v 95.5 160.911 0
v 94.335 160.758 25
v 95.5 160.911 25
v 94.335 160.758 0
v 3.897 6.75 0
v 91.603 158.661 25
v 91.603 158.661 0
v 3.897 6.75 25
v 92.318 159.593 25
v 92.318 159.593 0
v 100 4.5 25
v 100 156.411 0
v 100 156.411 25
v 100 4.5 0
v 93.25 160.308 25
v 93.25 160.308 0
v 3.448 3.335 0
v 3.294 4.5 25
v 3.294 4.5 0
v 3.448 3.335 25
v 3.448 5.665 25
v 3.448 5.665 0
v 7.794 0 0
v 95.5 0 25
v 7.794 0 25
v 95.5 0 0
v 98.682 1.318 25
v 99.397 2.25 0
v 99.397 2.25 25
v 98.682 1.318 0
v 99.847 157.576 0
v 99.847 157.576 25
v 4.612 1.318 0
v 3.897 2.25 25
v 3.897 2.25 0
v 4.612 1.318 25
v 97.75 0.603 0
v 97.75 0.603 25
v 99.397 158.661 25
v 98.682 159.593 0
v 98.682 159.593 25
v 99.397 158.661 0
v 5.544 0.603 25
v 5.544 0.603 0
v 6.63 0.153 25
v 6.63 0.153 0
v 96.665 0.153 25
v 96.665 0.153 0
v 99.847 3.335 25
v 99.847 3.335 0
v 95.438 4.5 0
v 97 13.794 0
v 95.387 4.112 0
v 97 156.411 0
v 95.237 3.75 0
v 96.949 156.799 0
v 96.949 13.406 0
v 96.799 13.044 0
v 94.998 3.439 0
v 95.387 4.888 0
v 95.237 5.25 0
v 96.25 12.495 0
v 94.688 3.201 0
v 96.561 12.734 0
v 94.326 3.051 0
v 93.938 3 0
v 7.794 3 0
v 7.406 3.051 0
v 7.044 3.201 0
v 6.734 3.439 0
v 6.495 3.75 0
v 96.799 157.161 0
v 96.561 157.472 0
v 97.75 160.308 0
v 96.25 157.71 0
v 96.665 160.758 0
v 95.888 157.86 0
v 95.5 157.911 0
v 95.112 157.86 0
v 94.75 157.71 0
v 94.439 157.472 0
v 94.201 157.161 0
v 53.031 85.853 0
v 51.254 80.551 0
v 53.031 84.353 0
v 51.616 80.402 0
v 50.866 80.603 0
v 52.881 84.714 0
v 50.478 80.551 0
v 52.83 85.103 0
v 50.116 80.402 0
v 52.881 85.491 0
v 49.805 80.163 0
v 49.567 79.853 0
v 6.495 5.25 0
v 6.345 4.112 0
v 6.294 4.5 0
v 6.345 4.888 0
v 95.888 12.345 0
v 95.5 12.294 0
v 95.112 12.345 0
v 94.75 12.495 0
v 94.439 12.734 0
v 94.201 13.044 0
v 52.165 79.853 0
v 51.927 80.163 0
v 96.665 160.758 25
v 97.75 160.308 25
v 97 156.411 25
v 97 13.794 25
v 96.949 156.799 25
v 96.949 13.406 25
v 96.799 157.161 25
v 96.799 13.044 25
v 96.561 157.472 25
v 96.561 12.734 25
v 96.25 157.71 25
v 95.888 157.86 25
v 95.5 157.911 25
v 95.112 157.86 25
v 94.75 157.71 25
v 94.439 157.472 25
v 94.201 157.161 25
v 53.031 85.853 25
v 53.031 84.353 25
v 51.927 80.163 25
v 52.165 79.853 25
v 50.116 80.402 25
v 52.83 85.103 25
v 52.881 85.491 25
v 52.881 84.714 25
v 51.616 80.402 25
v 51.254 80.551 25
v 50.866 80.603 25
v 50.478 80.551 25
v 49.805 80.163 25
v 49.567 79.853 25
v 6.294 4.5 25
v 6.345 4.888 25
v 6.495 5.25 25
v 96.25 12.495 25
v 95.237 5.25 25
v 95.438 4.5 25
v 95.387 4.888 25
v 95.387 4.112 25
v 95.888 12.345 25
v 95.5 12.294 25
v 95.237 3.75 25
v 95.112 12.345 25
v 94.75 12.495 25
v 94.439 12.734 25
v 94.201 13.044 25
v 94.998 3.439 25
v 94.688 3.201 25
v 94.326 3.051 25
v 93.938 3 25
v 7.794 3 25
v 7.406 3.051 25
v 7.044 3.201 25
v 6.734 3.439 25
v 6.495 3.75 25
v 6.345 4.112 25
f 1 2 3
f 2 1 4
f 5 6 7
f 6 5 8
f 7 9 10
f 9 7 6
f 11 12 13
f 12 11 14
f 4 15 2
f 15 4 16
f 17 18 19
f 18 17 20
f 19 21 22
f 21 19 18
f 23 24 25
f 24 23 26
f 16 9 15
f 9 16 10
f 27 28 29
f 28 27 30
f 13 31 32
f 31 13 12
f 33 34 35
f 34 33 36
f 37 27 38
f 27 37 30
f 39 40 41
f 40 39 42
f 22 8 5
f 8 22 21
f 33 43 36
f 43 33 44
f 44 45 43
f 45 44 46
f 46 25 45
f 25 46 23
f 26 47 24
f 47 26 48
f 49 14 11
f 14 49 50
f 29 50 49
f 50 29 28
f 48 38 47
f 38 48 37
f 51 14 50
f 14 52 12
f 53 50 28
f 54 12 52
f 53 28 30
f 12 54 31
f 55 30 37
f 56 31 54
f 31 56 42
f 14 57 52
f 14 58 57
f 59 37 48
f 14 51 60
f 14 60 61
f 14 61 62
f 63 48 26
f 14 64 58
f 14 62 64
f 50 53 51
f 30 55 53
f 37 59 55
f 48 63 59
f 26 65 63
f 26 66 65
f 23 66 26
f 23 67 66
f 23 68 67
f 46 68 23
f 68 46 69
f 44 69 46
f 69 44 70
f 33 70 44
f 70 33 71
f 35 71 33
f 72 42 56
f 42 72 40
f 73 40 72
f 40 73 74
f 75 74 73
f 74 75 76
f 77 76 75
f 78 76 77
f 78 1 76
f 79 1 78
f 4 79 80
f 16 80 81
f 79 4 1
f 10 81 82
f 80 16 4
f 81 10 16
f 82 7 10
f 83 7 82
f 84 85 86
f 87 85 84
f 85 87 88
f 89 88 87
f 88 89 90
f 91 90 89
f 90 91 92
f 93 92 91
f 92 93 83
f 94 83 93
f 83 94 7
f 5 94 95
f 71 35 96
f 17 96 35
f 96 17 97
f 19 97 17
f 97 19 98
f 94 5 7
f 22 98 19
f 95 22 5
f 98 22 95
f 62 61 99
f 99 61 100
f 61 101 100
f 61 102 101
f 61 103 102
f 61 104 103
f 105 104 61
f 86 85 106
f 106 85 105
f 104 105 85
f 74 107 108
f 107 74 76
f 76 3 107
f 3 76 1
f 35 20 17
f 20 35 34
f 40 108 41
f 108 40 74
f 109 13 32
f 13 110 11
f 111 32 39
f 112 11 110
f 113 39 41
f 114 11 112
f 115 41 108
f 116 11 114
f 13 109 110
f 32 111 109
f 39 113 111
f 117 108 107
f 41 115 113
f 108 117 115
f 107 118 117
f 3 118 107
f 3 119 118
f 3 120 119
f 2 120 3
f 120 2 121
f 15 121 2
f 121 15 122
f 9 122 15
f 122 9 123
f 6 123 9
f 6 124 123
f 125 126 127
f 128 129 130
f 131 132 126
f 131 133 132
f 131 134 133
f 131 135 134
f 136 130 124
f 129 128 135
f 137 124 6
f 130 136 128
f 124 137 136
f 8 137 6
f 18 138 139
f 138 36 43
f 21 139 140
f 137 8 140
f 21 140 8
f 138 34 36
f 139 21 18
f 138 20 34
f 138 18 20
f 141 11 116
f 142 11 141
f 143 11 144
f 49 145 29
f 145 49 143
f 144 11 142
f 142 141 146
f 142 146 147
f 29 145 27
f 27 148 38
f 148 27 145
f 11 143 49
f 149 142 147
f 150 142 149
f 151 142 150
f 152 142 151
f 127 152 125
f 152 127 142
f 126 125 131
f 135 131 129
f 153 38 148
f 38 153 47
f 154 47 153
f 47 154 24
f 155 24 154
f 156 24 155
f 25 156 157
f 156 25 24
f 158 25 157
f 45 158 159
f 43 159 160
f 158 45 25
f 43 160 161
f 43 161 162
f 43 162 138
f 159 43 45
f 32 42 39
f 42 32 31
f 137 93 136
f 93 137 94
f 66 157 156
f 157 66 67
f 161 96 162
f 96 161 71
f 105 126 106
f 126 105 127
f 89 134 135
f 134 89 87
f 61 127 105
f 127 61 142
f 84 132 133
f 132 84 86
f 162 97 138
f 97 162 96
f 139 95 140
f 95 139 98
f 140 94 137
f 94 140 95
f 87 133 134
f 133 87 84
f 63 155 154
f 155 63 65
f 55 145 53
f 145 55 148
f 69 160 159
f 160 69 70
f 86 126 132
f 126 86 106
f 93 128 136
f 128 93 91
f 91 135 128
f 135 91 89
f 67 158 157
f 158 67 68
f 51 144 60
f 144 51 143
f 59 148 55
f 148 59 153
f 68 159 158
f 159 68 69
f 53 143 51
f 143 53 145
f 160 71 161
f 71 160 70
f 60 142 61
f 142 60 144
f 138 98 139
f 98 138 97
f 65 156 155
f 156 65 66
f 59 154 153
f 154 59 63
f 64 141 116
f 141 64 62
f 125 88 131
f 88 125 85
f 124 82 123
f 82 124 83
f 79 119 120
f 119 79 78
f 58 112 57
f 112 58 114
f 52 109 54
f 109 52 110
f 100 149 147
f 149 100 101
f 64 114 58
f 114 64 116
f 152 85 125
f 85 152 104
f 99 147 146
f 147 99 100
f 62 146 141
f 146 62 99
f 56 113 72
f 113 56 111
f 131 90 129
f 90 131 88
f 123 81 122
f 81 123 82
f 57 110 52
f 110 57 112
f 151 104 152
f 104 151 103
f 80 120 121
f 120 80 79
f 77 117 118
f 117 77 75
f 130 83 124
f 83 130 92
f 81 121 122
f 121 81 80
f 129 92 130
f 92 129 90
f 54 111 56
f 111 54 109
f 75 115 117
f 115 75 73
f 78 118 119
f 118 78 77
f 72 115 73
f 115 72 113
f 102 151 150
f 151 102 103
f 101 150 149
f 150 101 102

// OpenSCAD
// Configurable laptop stand

// Copyright (C) 2017 Embecosm Limited (www.embecosm.com)

// Contributor: Jeremy Bennett <jeremy.bennett@embecosm.com>

// This file is licensed under the Creative Commons Attribution-ShareAlike 3.0
// Unported License. To view a copy of this license, visit
// http://creativecommons.org/licenses/by-sa/3.0/ or send a letter to Creative
// Commons, PO Box 1866, Mountain View, CA 94042, USA.


// Measure the laptop thickness from the desk to the flat with the laptop
// open.

LAPTOP_T = 22;

// Thickness of the wall

T = 3.0;

// Degree of rounding of the inner edges

INNER_R = 1.5;

// Degree of rounding of the outer edges

OUTER_R = INNER_R + T;

// Angle of the stand, plus it opposite angle

A = 60.0;
B = 90.0 - A;

// Breadth of the stand, which since we are printing on our side is the height
// of the print.

H = 25;

// Length of the face.  This is the longest part of the stand, so limited by
// the printer.

F = 200.0;

// Other edges, base and back

BASE = F * cos (A);
BACK = F * sin (A);

// Various lines of use to us

//   Face:                 y = tan (A) * x + 0
//   Inside face by w:     y = tan (A) * x - w / cos A
//   Base:                 y = 0
//   Inside base by w:     y = w
//   Back:                 x = F * cos (A)
//   Inside back by w:     x = F * cos (A) - w
//   Mid split:            y = -tan (A) * x + F * sin (A)
//   Below mid-split by w: y = -tan A() * x + F * sin (A) - w / cos (A)
//   Above mid-split by w: y = -tan A() * x + F * sin (A) + w / cos (A)

// Solving gives us the following useful intersections for offset lines:

// Face (w) & base (w): (w / tan (A / 2), w)

// Back (w) & base (w): (F * cos (A) - w, w)

// Face (w) & back (w): (F * cos (A) - w, F * sin (A) - w / tan (B / 2)

// Mid-split (+w1) & base (w2): (1 / tan (A) * (F * sin (A) + w1 / cos (A)
//                                              - w2), w2)

// Mid-split (+w1) & face (w2): (1/2 * (F * cos (A) + (w1 - w2)
//                                                 / (tan (A) * cos (A))),
//                               1/2 * (F * sin (A) - (w1 + w2 * (1 - tan (A)))
//                                                  / cos (A)))

// Mid-split (-w1) & face (w2): (1/2 * (F * cos (A) - (w1 + w2)
//                                                 / (tan (A) * cos (A))),
//                               1/2 * (F * sin (A) + (w1 - w2 * (1 - tan (A)))
//                                                  / cos (A)))

// Mid-split (-w1) & back (w2): (F * cos (A) - w2, (w2* sin (A) + w1) / cos (A))


// Function to compute intersection of 2 lines

//   y = m1 * x + c1
//   y = m2 * x + c2

// Equating the two we get

//   m1 * x + c1 = m2 * x + c2
//   (m1 - m2) * x = c2 - c1
//   x = (c2 - c1) / (m1 - m2)

//   y = m1 * (c2 - c1) / (m1 - m2) + c1

// We return a vector [x, y], where z = 0

function intersect (m1, c1, m2, c2, z = 0) =
     [(c2 - c1) / (m1 - m2), m1 * (c2 - c1) / (m1 - m2) + c1, z];


// Function to computer intersection of 2 lines where one is vertical

//   y = m * x + c
//   x = k

// Equating the two we can solve for y

//   y = m * k + c

// We return a vector [x, y, z], where z = 0

function intersect2 (m, c, k, z = 0) =
     [k, m * k + c, z];


// Function to compute the intercept of a parallel line at a specified offset

// Given a line

//   y = m * x + c

// We compute the parallel line

//   y = m * x + c'

// Such that the second line is a specified distance, w, apart. If w > 0, then
// c' > c. Result is c'.

function parallel (m, c, w) =
     (w == 0) ? c :
     (w > 0) ? c + sqrt (w * w * (m * m + 1)) : c - sqrt (w * w * (m * m + 1));


// Block outline of main stand part.

// We use the intersections of OUTER_R inside the main outline by w

//   Face:     y = tan (A) * x
//   Case:     y = 0
//   Back:     x = F * cos (A)

// where w = OUTER_R


// Function to compute the center of a circle touching two lines.

// The lines are:

//   y = m1 * x + c1
//   y = m2 * x + c2

// We assume the first line is clockwise of the second line, which controls
// which of the four possible circles we find.

function cc (m1, c1, m2, c2, r, z = 0) =
     let (start = intersect (m1, c1, m2, c2, z),
	  B = atan (m1),
	  D = atan ((m2 - m1) / (1 + m1 * m2)),
	  E = D / 2.0,
	  b = r / sin (E),
	  xinc = b * cos (E + B),
	  yinc = b * sin (E + B))
     [start [0] + xinc, start[1] + yinc, z];


// Function to compute the center of a circle touching two lines, one of which
// is vertical.

// We assume the first line is clockwise of the second line, which controls
// which of the four possible circles we find.

function cc2 (m, c, k, r, z = 0) =
     let (start = intersect (m1, c1, m2, c2, z),
	  B = atan (m1),
	  D = atan ((m2 - m1) / (1 + m1 * m2)),
	  E = D / 2.0,
	  b = r / sin (E),
	  xinc = b * cos (E + B),
	  yinc = b * sin (E + B))
     [start [0] + xinc, start[1] + yinc, z];


module main_block () {
     w = OUTER_R;

     hull () {
	  translate (v = cc (m1 = 0,
			     c1 = 0,
			     m2 = tan(A),
			     c2 = 0,
			     r = w,
			     z = 0))
	       cylinder (r = OUTER_R, h = H, center = false, $fn = 24);
	  translate (v = intersect2 (m = 0,
				     c = w,
				     k = F * cos (A) - w,
			             z = 0))
	       cylinder (r = OUTER_R, h = H, center = false, $fn = 24);
	  translate (v = intersect2 (m = tan (A),
				     c = parallel (m = tan (A),
						   c = 0,
						   w = -w),
				     k = F * cos (A) - w,
			             z = 0))
	       cylinder (r = OUTER_R, h = H, center = false, $fn = 24);
     }
}


// Lower hole

// We use the intersection of OUTER_R inside the main outline and a line
// parallel to the mid-split line by OUTER_R / 2.  The mid-split line is

//    y = -tan (A) * x + F * sin (A)

module lo_hole () {
     w1 = OUTER_R;
     w2 = OUTER_R / 1.5;

     hull () {
	  translate (v = intersect (m1 = tan (A),
				    c1 = parallel (m = tan (A),
						   c = 0,
						   w = -w1),
				    m2 = 0,
				    c2 = w1,
				    z = -H))
	       cylinder (r = INNER_R, h = H * 3, center = false, $fn = 24);
	  translate (v = intersect (m1 = -tan (A),
				    c1 = parallel (m = -tan (A),
						   c = F * sin (A),
						   w = -w2),
				    m2 = tan (A),
				    c2 = parallel (m = tan (A),
						   c = 0,
						   w = -w1),
			            z = -H))
	       cylinder (r = INNER_R, h = H * 3, center = false, $fn = 24);
	  translate (v = intersect (m1 = 0,
				    c1 = w1,
				    m2 = -tan (A),
				    c2 = parallel (m = -tan (A),
						   c = F * sin (A),
						   w = -w2),
			            z = -H))
	       cylinder (r = INNER_R, h = H * 3, center = false, $fn = 24);
     }
}


// Upper hole

// We use the intersection of OUTER_R inside the main outline and a line
// parallel to the mid-split line by OUTER_R / 2.  The mid-split line is

//    y = -tan (A) * x + F * sin (A)

module hi_hole () {
     w1 = OUTER_R;
     w2 = OUTER_R / 1.5;

     hull () {
	  translate (v = intersect (m1 = -tan (A),
				    c1 = parallel (m = -tan (A),
						   c = F * sin (A),
						   w = w2),
				    m2 = tan (A),
				    c2 = parallel (m = tan (A),
						   c = 0,
						   w = -w1),
			            z = -H))
	       cylinder (r = INNER_R, h = H * 3, center = false, $fn = 24);
	  translate (v = intersect2 (m = tan (A),
				     c = parallel (m = tan (A),
						   c = 0,
						   w = -w1),
				     k = F * cos (A) - w1,
				     z = -H))
	       cylinder (r = INNER_R, h = H * 3, center = false, $fn = 24);
	  translate (v = intersect2 (m = -tan (A),
				     c = parallel (m = -tan (A),
						   c = F * sin (A),
						   w = w2),
				     k = F * cos (A) - w1,
			            z = -H))
	       cylinder (r = INNER_R, h = H * 3, center = false, $fn = 24);
     }
}


// The complete stand

module stand () {
     difference () {
	  main_block ();
	  lo_hole ();
	  hi_hole ();
     }
}


stand ();
